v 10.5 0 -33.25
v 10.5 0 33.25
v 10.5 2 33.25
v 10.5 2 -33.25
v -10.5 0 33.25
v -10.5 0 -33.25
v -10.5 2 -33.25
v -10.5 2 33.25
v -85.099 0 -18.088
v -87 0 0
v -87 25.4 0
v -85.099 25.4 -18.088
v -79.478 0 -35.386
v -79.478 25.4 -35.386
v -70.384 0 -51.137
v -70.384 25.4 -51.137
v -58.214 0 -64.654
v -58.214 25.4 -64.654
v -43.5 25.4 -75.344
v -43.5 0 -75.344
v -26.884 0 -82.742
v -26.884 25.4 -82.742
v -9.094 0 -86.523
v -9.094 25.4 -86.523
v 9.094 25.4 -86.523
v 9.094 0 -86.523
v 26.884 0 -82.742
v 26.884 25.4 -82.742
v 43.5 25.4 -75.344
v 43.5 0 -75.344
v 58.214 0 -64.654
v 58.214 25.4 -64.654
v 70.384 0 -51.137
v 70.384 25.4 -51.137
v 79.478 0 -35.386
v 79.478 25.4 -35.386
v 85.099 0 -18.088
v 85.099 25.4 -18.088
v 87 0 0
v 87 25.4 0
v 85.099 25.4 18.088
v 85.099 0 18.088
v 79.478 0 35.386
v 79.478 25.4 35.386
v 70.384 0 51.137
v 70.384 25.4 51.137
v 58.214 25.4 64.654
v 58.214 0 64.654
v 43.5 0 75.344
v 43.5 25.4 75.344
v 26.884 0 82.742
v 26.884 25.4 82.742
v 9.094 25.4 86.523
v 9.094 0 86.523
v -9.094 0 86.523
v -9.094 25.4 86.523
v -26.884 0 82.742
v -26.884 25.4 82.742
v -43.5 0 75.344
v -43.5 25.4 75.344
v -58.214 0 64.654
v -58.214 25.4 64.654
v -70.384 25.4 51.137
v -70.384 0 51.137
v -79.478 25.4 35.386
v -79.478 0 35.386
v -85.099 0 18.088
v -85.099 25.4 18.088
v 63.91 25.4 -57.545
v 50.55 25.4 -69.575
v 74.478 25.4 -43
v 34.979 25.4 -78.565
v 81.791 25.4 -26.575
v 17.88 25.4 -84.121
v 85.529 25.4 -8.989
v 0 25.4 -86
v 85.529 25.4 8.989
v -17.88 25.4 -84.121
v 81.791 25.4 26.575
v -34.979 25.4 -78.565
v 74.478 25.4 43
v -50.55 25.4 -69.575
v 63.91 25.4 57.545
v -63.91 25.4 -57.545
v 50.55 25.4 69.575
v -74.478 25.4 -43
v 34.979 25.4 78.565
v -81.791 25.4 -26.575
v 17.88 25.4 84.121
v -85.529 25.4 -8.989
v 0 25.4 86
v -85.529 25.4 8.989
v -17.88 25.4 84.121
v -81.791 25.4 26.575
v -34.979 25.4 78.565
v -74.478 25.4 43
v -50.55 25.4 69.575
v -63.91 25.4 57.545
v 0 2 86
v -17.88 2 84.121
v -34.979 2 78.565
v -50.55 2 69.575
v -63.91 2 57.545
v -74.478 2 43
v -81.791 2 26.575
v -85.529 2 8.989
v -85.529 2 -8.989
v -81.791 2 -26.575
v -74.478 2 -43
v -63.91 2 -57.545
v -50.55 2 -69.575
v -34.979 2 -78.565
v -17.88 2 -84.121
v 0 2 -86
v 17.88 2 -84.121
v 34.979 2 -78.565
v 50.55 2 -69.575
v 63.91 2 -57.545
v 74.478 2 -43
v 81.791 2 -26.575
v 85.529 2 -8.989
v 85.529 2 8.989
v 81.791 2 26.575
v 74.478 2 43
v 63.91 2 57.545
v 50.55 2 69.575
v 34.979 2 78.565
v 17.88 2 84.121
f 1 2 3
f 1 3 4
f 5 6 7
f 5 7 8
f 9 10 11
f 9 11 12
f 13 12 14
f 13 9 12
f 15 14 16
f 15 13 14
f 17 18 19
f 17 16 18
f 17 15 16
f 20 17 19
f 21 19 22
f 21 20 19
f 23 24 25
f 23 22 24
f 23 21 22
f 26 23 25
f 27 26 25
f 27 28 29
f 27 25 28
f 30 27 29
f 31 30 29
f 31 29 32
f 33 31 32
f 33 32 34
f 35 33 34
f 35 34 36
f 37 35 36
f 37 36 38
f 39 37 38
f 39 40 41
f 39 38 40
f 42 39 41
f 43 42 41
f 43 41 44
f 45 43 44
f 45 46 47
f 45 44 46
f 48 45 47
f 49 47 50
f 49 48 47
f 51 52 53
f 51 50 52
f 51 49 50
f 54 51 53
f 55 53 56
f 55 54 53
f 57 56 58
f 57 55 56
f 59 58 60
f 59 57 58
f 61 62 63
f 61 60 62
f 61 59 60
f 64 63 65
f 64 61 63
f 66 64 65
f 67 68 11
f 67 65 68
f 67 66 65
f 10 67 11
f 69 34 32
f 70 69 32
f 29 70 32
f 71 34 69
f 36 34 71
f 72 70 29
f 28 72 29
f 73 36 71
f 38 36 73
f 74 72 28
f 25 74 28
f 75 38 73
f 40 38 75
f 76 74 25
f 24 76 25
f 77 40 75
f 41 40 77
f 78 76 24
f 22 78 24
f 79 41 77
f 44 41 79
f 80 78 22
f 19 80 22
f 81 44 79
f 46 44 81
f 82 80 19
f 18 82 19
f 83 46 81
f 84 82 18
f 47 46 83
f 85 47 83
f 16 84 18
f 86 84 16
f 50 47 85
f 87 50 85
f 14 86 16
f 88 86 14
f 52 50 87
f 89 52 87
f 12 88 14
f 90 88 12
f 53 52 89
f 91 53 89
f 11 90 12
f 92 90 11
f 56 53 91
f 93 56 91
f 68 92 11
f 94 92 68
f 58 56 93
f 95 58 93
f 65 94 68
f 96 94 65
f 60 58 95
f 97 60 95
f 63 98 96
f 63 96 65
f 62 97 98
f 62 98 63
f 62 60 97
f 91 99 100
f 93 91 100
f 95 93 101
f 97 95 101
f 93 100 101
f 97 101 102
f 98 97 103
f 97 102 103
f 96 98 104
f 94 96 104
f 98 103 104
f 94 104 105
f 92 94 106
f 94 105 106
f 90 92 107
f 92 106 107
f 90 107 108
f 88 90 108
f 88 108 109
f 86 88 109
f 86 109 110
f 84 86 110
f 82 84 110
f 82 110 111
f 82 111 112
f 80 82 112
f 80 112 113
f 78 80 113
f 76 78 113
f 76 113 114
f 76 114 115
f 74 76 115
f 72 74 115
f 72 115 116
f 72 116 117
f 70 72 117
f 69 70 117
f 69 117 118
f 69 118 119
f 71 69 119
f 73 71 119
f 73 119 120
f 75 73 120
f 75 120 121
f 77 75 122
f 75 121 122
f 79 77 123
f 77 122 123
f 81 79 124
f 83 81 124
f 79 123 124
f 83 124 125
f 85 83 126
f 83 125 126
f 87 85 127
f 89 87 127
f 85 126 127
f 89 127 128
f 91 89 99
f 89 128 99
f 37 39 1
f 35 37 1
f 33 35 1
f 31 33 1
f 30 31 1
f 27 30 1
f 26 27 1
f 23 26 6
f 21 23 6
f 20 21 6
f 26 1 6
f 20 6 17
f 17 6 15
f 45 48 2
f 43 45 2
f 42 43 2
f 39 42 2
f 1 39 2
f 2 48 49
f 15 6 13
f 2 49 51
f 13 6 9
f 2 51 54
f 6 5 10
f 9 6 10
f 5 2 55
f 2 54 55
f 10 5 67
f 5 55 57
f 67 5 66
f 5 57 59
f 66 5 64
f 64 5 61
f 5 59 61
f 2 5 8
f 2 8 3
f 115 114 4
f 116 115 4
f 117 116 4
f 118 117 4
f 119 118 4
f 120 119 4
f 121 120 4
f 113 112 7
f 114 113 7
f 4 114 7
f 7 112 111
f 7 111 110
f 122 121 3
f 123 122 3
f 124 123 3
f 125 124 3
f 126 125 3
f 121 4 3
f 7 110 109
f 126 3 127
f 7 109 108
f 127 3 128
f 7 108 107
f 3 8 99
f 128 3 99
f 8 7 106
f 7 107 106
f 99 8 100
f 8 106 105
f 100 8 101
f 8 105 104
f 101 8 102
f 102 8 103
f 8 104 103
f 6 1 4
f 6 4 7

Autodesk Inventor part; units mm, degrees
ref_plane "XZ Plane" through (0, 0, 0) normal (0, 1, 0) x (-1, 0, 0)
ref_plane "XY Plane" through (0, 0, 0) normal (0, 0, 1) x (1, 0, 0)
sketch "Sketch1" plane through (0, 0, 0) normal (0, 1, 0) x (-1, 0, 0)
  circle A0 centre (0, 0) radius 87
  line L0 (10.5, 33.25) -> (-10.5, 33.25)
  line L1 (-10.5, 33.25) -> (-10.5, -33.25)
  line L2 (-10.5, -33.25) -> (10.5, -33.25)
  line L3 (10.5, -33.25) -> (10.5, 33.25)
  line L4 (10.5, 33.25) -> (-10.5, -33.25) construction
  line L5 (-10.5, 33.25) -> (10.5, -33.25) construction
  dimension "d0" = 174
  dimension "d1" = 21
  dimension "d2" = 66.5
ref_plane "Work Plane1" through (0, 0, 0) normal (1, 0, 0) x (0, 1, 0)
extrude "Extrusion2" add sketch "Sketch1" along normal blind 25.4
sketch "Sketch3" plane through (0, 25.4, 0) normal (0, 1, 0) x (1, 0, 0)
  circle A0 centre (0, 0) radius 86
  dimension "d63" = 172
hole "Hole2" at (0, 25.4, 0) direction (0, -1, 0) diameter 172 depth 23.4
properties part number "Bottom Cap"
